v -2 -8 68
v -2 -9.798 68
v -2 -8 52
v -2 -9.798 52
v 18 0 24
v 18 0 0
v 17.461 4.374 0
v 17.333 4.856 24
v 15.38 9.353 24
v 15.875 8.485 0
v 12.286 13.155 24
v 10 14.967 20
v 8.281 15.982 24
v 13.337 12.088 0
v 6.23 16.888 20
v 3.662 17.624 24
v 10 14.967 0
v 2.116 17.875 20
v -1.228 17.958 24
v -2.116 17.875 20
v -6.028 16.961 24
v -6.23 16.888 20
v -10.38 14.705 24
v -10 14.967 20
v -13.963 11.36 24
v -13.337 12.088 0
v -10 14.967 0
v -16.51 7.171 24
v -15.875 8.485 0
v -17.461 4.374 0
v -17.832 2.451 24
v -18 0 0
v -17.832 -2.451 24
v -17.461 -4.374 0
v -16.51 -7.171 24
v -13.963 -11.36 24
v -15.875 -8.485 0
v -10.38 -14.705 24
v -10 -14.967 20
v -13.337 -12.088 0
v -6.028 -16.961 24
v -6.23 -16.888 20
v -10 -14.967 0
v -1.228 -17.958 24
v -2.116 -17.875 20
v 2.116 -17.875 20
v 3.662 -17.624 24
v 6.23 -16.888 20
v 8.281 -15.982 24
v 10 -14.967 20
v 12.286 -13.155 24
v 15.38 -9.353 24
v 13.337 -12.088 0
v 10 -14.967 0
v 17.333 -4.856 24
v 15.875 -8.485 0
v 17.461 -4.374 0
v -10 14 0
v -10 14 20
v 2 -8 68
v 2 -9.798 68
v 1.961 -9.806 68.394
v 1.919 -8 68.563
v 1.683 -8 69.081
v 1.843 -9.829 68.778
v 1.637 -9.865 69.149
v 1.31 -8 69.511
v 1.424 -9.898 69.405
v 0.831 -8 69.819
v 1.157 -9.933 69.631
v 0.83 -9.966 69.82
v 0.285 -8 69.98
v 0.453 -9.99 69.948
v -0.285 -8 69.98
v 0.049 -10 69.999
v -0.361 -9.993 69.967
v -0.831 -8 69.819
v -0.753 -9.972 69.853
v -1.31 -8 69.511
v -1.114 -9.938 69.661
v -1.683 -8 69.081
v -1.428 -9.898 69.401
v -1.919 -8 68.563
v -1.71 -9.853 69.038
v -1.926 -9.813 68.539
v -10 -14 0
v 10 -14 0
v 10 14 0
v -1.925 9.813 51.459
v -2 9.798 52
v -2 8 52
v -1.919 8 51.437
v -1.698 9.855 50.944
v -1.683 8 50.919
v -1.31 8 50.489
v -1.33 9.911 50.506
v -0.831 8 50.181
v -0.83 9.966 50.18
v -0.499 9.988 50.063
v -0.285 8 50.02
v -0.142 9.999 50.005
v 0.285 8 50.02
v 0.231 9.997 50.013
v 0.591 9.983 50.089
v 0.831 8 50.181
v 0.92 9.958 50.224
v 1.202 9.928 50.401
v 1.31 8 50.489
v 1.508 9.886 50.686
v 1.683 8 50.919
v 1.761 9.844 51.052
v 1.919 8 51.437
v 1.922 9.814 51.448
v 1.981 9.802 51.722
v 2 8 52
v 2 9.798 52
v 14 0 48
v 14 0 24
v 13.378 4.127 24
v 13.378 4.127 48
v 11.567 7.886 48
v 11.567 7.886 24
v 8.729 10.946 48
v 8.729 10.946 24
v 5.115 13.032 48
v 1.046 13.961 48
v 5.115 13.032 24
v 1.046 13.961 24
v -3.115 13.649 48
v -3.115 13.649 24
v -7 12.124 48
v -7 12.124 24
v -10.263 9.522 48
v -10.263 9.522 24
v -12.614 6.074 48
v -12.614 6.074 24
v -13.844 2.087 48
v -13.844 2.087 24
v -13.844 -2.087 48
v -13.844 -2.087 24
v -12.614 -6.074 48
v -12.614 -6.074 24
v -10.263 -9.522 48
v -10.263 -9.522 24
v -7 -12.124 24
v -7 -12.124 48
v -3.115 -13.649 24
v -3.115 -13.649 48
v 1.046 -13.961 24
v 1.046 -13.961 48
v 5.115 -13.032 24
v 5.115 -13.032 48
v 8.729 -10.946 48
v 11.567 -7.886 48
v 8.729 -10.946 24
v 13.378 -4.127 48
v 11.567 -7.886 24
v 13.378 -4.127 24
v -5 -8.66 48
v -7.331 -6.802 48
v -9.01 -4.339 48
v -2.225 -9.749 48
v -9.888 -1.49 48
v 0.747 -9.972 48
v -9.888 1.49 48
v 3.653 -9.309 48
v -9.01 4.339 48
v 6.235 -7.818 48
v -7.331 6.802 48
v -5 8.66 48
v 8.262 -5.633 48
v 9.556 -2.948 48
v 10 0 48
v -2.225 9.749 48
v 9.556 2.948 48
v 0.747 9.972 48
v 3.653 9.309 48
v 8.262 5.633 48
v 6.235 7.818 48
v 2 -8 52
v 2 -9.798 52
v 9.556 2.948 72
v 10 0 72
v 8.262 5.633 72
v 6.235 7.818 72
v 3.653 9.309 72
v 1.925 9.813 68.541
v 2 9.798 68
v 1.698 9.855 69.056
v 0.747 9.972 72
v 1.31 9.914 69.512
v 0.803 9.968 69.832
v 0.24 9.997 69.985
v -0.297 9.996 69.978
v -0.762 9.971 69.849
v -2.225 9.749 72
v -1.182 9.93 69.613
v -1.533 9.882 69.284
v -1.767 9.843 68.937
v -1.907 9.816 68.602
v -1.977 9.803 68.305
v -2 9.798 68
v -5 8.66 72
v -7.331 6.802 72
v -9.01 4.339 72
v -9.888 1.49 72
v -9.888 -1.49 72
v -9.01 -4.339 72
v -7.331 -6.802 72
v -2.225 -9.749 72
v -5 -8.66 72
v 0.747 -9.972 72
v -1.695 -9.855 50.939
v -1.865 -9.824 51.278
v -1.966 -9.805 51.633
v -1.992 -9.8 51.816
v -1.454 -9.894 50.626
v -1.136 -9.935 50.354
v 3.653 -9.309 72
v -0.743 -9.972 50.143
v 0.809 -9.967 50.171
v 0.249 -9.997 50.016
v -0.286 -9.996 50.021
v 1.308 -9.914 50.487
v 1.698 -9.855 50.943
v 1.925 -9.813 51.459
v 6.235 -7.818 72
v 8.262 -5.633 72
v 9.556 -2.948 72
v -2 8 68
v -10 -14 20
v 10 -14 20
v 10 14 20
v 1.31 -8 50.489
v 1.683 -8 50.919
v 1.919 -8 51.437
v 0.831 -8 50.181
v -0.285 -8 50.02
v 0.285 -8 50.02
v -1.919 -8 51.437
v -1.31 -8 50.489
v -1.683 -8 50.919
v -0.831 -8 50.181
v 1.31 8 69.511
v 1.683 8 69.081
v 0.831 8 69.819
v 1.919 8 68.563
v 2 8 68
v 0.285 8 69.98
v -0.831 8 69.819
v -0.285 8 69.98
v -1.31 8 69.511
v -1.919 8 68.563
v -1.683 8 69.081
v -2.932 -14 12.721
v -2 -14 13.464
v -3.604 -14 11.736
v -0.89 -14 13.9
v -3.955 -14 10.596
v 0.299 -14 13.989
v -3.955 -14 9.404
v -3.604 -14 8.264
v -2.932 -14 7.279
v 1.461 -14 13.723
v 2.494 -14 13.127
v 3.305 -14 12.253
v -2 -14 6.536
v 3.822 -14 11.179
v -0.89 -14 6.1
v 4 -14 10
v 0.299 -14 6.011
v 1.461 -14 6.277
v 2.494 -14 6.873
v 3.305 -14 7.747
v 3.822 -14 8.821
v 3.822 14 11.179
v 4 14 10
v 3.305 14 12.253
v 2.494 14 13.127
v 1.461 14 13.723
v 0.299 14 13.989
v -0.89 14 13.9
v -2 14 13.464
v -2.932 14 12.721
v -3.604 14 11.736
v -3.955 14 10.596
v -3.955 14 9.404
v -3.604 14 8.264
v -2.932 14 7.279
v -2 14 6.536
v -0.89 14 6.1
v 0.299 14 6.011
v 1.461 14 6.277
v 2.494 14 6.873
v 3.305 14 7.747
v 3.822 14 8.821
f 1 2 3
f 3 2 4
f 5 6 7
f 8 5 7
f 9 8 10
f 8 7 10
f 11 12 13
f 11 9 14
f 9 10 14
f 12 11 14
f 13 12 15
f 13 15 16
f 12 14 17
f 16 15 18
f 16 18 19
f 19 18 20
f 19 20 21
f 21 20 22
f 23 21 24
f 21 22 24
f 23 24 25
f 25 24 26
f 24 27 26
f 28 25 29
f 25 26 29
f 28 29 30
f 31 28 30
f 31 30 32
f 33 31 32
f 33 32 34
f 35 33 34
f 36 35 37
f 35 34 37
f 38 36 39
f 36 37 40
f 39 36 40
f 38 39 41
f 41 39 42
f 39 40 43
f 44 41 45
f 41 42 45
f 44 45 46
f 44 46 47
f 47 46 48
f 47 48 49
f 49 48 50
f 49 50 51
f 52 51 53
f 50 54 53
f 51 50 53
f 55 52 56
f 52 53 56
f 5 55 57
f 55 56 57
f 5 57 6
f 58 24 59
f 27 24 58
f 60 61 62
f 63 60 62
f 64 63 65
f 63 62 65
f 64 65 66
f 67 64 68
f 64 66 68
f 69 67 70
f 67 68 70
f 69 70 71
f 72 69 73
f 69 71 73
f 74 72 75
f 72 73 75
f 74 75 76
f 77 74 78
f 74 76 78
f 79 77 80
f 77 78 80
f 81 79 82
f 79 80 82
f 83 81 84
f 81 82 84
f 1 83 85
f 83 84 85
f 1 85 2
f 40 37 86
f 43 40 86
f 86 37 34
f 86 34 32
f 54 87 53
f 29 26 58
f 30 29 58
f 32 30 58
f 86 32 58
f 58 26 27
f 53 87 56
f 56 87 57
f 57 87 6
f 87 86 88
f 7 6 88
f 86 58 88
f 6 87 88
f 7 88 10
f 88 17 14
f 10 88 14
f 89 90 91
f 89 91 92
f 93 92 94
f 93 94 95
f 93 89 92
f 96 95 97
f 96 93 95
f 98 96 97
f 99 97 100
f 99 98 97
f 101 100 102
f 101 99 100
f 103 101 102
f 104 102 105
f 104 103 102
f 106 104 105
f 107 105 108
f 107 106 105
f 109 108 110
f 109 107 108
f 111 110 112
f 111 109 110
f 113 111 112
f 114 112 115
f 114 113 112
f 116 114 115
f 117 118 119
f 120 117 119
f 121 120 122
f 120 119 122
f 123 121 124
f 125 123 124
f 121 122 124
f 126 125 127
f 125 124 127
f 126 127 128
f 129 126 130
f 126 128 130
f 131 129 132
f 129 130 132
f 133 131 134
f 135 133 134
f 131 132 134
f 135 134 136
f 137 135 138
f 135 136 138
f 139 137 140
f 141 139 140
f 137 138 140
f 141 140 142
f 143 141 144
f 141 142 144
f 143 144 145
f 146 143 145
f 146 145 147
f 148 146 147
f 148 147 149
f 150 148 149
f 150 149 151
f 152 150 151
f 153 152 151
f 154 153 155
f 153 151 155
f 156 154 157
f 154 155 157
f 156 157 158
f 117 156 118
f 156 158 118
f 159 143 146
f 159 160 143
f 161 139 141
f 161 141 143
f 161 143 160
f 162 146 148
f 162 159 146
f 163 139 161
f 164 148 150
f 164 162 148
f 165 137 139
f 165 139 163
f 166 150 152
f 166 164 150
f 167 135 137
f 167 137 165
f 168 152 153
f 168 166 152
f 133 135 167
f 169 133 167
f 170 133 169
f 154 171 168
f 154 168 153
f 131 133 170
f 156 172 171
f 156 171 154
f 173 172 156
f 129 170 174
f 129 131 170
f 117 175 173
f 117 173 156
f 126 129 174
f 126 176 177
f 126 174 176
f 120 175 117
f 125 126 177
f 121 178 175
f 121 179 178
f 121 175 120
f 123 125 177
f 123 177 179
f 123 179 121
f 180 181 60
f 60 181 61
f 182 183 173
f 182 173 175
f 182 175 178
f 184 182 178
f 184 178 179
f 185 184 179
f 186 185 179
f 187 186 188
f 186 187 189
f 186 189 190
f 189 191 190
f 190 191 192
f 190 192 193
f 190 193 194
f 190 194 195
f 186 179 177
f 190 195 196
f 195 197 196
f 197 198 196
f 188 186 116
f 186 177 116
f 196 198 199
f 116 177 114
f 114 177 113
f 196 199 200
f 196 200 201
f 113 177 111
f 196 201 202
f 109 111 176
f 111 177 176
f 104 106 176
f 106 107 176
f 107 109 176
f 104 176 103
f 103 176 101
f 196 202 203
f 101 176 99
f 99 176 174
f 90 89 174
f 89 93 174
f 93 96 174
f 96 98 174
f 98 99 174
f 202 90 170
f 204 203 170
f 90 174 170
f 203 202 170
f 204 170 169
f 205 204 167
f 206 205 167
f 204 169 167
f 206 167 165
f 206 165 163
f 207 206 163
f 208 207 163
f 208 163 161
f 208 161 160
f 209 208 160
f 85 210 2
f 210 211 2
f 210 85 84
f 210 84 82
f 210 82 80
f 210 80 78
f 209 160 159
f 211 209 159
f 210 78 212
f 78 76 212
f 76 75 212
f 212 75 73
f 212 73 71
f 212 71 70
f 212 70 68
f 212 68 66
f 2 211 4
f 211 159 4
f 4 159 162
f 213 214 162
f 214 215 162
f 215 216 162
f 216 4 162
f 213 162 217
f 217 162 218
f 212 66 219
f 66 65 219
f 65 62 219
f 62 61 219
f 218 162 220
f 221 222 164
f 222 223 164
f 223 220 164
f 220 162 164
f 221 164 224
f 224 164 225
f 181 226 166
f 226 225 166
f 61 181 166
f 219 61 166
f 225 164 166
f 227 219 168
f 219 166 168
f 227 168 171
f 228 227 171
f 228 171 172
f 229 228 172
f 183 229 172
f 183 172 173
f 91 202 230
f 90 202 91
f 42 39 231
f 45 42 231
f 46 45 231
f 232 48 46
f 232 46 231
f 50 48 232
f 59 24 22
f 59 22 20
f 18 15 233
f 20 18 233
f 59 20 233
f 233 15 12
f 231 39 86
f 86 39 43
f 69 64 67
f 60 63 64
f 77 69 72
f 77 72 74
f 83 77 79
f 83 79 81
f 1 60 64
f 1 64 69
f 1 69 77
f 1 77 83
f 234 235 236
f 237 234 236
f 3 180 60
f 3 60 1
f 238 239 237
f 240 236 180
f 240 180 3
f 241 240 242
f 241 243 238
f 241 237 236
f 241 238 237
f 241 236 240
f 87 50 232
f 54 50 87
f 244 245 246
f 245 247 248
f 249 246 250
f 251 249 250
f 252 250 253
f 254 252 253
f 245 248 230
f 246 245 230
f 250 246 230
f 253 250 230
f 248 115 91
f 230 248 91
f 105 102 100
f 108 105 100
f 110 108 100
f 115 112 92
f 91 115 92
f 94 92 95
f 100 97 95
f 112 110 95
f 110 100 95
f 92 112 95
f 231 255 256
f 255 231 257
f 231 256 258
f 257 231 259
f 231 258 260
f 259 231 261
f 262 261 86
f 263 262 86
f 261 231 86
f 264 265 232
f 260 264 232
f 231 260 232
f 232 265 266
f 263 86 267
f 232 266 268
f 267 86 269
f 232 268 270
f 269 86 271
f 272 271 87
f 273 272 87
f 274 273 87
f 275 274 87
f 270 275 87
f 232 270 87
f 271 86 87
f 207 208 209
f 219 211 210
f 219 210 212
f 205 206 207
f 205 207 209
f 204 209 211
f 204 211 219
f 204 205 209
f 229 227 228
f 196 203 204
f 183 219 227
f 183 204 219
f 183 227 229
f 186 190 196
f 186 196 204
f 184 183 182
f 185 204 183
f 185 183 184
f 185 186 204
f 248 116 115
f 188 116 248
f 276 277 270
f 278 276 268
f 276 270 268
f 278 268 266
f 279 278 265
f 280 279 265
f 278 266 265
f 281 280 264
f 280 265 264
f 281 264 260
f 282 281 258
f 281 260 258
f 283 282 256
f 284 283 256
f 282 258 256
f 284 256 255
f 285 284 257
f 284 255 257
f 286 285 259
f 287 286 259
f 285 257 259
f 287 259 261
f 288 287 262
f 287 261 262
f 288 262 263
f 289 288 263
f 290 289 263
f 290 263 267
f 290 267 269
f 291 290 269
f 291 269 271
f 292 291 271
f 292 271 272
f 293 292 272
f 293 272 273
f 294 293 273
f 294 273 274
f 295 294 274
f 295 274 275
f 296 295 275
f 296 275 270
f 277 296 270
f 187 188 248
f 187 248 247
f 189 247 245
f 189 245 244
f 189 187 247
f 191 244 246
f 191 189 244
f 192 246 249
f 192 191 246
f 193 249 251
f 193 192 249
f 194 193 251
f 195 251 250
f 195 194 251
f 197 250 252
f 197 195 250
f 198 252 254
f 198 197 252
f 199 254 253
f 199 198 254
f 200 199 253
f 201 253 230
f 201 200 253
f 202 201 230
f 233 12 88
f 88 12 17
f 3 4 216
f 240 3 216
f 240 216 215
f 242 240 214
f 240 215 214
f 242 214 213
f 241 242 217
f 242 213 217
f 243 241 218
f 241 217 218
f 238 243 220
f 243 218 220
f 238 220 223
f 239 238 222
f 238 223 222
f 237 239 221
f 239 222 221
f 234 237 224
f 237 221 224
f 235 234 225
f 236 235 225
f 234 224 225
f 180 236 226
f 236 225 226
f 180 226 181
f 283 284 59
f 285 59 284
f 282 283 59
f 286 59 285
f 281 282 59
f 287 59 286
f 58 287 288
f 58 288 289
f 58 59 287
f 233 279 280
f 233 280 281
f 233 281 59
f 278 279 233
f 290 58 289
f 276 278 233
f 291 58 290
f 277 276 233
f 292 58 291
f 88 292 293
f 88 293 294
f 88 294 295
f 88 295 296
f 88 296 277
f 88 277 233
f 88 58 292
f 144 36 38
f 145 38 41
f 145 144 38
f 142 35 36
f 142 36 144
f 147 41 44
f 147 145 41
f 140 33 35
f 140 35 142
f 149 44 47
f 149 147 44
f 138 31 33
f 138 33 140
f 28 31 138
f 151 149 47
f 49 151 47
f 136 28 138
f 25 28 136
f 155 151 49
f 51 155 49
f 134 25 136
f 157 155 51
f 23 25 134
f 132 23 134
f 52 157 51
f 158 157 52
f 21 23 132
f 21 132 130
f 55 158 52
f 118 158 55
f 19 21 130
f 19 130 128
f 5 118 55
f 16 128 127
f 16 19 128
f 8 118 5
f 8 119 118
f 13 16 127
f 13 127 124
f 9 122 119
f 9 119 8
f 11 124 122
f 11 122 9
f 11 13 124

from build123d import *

# Parameters (mm, degrees)
CROQUIS1_R              = 18
SALIENTE_EXTRUIR1_DEPTH = 24
CROQUIS2_R              = 14
SALIENTE_EXTRUIR2_DEPTH = 24
CROQUIS3_R              = 10
SALIENTE_EXTRUIR3_DEPTH = 24
CORTAR_EXTRUIR1_DEPTH   = 2
CORTAR_EXTRUIR2_DEPTH   = 2
CROQUIS6_W              = 20
CROQUIS6_H              = 20
CORTAR_EXTRUIR3_DEPTH   = 4
CROQUIS7_W              = 20
CROQUIS7_H              = 20
CORTAR_EXTRUIR4_DEPTH   = 4
CROQUIS8_R              = 4
CORTAR_EXTRUIR5_DEPTH   = 33


with BuildPart() as part:
    # Croquis1 → Saliente-Extruir1 (new body)
    with BuildSketch(Plane.XY):
        Circle(CROQUIS1_R)
    extrude(amount=SALIENTE_EXTRUIR1_DEPTH)

    # Croquis2 → Saliente-Extruir2 (add)
    with BuildSketch(Plane.XY.offset(24)):
        Circle(CROQUIS2_R)
    extrude(amount=SALIENTE_EXTRUIR2_DEPTH)

    # Croquis3 → Saliente-Extruir3 (add)
    with BuildSketch(Plane.XY.offset(48)):
        Circle(CROQUIS3_R)
    extrude(amount=SALIENTE_EXTRUIR3_DEPTH)

    # Croquis4 → Cortar-Extruir1 (cut)
    with BuildSketch(Plane(origin=(0, 10, 0), x_dir=(1, 0, 0), z_dir=(0, 1, 0))):
        with BuildLine():
            Line((2, -52), (2, -68))
            ThreePointArc((2, -68), (0, -70), (-2, -68))
            Line((-2, -68), (-2, -52))
            ThreePointArc((-2, -52), (0, -50), (2, -52))
        make_face()
    extrude(amount=-CORTAR_EXTRUIR1_DEPTH, mode=Mode.SUBTRACT)

    # Croquis5 → Cortar-Extruir2 (cut)
    with BuildSketch(Plane(origin=(0, -10, 0), x_dir=(1, 0, 0), z_dir=(0, 1, 0))):
        with BuildLine():
            Line((-2, -68), (-2, -52))
            ThreePointArc((-2, -52), (0, -50), (2, -52))
            Line((2, -52), (2, -68))
            ThreePointArc((2, -68), (0, -70), (-2, -68))
        make_face()
    extrude(amount=CORTAR_EXTRUIR2_DEPTH, mode=Mode.SUBTRACT)

    # Croquis6 → Cortar-Extruir3 (cut)
    with BuildSketch(Plane(origin=(0, 18, 0), x_dir=(1, 0, 0), z_dir=(0, 1, 0))):
        with Locations((0, -10)):
            Rectangle(CROQUIS6_W, CROQUIS6_H)
    extrude(amount=-CORTAR_EXTRUIR3_DEPTH, mode=Mode.SUBTRACT)

    # Croquis7 → Cortar-Extruir4 (cut)
    with BuildSketch(Plane(origin=(0, -18, 0), x_dir=(1, 0, 0), z_dir=(0, 1, 0))):
        with Locations((0, -10)):
            Rectangle(CROQUIS7_W, CROQUIS7_H)
    extrude(amount=CORTAR_EXTRUIR4_DEPTH, mode=Mode.SUBTRACT)

    # Croquis8 → Cortar-Extruir5 (cut, through all)
    with BuildSketch(Plane.XZ.offset(14)):
        with Locations((0, 10)):
            Circle(CROQUIS8_R)
    extrude(amount=-CORTAR_EXTRUIR5_DEPTH, mode=Mode.SUBTRACT)


solid = part.part
